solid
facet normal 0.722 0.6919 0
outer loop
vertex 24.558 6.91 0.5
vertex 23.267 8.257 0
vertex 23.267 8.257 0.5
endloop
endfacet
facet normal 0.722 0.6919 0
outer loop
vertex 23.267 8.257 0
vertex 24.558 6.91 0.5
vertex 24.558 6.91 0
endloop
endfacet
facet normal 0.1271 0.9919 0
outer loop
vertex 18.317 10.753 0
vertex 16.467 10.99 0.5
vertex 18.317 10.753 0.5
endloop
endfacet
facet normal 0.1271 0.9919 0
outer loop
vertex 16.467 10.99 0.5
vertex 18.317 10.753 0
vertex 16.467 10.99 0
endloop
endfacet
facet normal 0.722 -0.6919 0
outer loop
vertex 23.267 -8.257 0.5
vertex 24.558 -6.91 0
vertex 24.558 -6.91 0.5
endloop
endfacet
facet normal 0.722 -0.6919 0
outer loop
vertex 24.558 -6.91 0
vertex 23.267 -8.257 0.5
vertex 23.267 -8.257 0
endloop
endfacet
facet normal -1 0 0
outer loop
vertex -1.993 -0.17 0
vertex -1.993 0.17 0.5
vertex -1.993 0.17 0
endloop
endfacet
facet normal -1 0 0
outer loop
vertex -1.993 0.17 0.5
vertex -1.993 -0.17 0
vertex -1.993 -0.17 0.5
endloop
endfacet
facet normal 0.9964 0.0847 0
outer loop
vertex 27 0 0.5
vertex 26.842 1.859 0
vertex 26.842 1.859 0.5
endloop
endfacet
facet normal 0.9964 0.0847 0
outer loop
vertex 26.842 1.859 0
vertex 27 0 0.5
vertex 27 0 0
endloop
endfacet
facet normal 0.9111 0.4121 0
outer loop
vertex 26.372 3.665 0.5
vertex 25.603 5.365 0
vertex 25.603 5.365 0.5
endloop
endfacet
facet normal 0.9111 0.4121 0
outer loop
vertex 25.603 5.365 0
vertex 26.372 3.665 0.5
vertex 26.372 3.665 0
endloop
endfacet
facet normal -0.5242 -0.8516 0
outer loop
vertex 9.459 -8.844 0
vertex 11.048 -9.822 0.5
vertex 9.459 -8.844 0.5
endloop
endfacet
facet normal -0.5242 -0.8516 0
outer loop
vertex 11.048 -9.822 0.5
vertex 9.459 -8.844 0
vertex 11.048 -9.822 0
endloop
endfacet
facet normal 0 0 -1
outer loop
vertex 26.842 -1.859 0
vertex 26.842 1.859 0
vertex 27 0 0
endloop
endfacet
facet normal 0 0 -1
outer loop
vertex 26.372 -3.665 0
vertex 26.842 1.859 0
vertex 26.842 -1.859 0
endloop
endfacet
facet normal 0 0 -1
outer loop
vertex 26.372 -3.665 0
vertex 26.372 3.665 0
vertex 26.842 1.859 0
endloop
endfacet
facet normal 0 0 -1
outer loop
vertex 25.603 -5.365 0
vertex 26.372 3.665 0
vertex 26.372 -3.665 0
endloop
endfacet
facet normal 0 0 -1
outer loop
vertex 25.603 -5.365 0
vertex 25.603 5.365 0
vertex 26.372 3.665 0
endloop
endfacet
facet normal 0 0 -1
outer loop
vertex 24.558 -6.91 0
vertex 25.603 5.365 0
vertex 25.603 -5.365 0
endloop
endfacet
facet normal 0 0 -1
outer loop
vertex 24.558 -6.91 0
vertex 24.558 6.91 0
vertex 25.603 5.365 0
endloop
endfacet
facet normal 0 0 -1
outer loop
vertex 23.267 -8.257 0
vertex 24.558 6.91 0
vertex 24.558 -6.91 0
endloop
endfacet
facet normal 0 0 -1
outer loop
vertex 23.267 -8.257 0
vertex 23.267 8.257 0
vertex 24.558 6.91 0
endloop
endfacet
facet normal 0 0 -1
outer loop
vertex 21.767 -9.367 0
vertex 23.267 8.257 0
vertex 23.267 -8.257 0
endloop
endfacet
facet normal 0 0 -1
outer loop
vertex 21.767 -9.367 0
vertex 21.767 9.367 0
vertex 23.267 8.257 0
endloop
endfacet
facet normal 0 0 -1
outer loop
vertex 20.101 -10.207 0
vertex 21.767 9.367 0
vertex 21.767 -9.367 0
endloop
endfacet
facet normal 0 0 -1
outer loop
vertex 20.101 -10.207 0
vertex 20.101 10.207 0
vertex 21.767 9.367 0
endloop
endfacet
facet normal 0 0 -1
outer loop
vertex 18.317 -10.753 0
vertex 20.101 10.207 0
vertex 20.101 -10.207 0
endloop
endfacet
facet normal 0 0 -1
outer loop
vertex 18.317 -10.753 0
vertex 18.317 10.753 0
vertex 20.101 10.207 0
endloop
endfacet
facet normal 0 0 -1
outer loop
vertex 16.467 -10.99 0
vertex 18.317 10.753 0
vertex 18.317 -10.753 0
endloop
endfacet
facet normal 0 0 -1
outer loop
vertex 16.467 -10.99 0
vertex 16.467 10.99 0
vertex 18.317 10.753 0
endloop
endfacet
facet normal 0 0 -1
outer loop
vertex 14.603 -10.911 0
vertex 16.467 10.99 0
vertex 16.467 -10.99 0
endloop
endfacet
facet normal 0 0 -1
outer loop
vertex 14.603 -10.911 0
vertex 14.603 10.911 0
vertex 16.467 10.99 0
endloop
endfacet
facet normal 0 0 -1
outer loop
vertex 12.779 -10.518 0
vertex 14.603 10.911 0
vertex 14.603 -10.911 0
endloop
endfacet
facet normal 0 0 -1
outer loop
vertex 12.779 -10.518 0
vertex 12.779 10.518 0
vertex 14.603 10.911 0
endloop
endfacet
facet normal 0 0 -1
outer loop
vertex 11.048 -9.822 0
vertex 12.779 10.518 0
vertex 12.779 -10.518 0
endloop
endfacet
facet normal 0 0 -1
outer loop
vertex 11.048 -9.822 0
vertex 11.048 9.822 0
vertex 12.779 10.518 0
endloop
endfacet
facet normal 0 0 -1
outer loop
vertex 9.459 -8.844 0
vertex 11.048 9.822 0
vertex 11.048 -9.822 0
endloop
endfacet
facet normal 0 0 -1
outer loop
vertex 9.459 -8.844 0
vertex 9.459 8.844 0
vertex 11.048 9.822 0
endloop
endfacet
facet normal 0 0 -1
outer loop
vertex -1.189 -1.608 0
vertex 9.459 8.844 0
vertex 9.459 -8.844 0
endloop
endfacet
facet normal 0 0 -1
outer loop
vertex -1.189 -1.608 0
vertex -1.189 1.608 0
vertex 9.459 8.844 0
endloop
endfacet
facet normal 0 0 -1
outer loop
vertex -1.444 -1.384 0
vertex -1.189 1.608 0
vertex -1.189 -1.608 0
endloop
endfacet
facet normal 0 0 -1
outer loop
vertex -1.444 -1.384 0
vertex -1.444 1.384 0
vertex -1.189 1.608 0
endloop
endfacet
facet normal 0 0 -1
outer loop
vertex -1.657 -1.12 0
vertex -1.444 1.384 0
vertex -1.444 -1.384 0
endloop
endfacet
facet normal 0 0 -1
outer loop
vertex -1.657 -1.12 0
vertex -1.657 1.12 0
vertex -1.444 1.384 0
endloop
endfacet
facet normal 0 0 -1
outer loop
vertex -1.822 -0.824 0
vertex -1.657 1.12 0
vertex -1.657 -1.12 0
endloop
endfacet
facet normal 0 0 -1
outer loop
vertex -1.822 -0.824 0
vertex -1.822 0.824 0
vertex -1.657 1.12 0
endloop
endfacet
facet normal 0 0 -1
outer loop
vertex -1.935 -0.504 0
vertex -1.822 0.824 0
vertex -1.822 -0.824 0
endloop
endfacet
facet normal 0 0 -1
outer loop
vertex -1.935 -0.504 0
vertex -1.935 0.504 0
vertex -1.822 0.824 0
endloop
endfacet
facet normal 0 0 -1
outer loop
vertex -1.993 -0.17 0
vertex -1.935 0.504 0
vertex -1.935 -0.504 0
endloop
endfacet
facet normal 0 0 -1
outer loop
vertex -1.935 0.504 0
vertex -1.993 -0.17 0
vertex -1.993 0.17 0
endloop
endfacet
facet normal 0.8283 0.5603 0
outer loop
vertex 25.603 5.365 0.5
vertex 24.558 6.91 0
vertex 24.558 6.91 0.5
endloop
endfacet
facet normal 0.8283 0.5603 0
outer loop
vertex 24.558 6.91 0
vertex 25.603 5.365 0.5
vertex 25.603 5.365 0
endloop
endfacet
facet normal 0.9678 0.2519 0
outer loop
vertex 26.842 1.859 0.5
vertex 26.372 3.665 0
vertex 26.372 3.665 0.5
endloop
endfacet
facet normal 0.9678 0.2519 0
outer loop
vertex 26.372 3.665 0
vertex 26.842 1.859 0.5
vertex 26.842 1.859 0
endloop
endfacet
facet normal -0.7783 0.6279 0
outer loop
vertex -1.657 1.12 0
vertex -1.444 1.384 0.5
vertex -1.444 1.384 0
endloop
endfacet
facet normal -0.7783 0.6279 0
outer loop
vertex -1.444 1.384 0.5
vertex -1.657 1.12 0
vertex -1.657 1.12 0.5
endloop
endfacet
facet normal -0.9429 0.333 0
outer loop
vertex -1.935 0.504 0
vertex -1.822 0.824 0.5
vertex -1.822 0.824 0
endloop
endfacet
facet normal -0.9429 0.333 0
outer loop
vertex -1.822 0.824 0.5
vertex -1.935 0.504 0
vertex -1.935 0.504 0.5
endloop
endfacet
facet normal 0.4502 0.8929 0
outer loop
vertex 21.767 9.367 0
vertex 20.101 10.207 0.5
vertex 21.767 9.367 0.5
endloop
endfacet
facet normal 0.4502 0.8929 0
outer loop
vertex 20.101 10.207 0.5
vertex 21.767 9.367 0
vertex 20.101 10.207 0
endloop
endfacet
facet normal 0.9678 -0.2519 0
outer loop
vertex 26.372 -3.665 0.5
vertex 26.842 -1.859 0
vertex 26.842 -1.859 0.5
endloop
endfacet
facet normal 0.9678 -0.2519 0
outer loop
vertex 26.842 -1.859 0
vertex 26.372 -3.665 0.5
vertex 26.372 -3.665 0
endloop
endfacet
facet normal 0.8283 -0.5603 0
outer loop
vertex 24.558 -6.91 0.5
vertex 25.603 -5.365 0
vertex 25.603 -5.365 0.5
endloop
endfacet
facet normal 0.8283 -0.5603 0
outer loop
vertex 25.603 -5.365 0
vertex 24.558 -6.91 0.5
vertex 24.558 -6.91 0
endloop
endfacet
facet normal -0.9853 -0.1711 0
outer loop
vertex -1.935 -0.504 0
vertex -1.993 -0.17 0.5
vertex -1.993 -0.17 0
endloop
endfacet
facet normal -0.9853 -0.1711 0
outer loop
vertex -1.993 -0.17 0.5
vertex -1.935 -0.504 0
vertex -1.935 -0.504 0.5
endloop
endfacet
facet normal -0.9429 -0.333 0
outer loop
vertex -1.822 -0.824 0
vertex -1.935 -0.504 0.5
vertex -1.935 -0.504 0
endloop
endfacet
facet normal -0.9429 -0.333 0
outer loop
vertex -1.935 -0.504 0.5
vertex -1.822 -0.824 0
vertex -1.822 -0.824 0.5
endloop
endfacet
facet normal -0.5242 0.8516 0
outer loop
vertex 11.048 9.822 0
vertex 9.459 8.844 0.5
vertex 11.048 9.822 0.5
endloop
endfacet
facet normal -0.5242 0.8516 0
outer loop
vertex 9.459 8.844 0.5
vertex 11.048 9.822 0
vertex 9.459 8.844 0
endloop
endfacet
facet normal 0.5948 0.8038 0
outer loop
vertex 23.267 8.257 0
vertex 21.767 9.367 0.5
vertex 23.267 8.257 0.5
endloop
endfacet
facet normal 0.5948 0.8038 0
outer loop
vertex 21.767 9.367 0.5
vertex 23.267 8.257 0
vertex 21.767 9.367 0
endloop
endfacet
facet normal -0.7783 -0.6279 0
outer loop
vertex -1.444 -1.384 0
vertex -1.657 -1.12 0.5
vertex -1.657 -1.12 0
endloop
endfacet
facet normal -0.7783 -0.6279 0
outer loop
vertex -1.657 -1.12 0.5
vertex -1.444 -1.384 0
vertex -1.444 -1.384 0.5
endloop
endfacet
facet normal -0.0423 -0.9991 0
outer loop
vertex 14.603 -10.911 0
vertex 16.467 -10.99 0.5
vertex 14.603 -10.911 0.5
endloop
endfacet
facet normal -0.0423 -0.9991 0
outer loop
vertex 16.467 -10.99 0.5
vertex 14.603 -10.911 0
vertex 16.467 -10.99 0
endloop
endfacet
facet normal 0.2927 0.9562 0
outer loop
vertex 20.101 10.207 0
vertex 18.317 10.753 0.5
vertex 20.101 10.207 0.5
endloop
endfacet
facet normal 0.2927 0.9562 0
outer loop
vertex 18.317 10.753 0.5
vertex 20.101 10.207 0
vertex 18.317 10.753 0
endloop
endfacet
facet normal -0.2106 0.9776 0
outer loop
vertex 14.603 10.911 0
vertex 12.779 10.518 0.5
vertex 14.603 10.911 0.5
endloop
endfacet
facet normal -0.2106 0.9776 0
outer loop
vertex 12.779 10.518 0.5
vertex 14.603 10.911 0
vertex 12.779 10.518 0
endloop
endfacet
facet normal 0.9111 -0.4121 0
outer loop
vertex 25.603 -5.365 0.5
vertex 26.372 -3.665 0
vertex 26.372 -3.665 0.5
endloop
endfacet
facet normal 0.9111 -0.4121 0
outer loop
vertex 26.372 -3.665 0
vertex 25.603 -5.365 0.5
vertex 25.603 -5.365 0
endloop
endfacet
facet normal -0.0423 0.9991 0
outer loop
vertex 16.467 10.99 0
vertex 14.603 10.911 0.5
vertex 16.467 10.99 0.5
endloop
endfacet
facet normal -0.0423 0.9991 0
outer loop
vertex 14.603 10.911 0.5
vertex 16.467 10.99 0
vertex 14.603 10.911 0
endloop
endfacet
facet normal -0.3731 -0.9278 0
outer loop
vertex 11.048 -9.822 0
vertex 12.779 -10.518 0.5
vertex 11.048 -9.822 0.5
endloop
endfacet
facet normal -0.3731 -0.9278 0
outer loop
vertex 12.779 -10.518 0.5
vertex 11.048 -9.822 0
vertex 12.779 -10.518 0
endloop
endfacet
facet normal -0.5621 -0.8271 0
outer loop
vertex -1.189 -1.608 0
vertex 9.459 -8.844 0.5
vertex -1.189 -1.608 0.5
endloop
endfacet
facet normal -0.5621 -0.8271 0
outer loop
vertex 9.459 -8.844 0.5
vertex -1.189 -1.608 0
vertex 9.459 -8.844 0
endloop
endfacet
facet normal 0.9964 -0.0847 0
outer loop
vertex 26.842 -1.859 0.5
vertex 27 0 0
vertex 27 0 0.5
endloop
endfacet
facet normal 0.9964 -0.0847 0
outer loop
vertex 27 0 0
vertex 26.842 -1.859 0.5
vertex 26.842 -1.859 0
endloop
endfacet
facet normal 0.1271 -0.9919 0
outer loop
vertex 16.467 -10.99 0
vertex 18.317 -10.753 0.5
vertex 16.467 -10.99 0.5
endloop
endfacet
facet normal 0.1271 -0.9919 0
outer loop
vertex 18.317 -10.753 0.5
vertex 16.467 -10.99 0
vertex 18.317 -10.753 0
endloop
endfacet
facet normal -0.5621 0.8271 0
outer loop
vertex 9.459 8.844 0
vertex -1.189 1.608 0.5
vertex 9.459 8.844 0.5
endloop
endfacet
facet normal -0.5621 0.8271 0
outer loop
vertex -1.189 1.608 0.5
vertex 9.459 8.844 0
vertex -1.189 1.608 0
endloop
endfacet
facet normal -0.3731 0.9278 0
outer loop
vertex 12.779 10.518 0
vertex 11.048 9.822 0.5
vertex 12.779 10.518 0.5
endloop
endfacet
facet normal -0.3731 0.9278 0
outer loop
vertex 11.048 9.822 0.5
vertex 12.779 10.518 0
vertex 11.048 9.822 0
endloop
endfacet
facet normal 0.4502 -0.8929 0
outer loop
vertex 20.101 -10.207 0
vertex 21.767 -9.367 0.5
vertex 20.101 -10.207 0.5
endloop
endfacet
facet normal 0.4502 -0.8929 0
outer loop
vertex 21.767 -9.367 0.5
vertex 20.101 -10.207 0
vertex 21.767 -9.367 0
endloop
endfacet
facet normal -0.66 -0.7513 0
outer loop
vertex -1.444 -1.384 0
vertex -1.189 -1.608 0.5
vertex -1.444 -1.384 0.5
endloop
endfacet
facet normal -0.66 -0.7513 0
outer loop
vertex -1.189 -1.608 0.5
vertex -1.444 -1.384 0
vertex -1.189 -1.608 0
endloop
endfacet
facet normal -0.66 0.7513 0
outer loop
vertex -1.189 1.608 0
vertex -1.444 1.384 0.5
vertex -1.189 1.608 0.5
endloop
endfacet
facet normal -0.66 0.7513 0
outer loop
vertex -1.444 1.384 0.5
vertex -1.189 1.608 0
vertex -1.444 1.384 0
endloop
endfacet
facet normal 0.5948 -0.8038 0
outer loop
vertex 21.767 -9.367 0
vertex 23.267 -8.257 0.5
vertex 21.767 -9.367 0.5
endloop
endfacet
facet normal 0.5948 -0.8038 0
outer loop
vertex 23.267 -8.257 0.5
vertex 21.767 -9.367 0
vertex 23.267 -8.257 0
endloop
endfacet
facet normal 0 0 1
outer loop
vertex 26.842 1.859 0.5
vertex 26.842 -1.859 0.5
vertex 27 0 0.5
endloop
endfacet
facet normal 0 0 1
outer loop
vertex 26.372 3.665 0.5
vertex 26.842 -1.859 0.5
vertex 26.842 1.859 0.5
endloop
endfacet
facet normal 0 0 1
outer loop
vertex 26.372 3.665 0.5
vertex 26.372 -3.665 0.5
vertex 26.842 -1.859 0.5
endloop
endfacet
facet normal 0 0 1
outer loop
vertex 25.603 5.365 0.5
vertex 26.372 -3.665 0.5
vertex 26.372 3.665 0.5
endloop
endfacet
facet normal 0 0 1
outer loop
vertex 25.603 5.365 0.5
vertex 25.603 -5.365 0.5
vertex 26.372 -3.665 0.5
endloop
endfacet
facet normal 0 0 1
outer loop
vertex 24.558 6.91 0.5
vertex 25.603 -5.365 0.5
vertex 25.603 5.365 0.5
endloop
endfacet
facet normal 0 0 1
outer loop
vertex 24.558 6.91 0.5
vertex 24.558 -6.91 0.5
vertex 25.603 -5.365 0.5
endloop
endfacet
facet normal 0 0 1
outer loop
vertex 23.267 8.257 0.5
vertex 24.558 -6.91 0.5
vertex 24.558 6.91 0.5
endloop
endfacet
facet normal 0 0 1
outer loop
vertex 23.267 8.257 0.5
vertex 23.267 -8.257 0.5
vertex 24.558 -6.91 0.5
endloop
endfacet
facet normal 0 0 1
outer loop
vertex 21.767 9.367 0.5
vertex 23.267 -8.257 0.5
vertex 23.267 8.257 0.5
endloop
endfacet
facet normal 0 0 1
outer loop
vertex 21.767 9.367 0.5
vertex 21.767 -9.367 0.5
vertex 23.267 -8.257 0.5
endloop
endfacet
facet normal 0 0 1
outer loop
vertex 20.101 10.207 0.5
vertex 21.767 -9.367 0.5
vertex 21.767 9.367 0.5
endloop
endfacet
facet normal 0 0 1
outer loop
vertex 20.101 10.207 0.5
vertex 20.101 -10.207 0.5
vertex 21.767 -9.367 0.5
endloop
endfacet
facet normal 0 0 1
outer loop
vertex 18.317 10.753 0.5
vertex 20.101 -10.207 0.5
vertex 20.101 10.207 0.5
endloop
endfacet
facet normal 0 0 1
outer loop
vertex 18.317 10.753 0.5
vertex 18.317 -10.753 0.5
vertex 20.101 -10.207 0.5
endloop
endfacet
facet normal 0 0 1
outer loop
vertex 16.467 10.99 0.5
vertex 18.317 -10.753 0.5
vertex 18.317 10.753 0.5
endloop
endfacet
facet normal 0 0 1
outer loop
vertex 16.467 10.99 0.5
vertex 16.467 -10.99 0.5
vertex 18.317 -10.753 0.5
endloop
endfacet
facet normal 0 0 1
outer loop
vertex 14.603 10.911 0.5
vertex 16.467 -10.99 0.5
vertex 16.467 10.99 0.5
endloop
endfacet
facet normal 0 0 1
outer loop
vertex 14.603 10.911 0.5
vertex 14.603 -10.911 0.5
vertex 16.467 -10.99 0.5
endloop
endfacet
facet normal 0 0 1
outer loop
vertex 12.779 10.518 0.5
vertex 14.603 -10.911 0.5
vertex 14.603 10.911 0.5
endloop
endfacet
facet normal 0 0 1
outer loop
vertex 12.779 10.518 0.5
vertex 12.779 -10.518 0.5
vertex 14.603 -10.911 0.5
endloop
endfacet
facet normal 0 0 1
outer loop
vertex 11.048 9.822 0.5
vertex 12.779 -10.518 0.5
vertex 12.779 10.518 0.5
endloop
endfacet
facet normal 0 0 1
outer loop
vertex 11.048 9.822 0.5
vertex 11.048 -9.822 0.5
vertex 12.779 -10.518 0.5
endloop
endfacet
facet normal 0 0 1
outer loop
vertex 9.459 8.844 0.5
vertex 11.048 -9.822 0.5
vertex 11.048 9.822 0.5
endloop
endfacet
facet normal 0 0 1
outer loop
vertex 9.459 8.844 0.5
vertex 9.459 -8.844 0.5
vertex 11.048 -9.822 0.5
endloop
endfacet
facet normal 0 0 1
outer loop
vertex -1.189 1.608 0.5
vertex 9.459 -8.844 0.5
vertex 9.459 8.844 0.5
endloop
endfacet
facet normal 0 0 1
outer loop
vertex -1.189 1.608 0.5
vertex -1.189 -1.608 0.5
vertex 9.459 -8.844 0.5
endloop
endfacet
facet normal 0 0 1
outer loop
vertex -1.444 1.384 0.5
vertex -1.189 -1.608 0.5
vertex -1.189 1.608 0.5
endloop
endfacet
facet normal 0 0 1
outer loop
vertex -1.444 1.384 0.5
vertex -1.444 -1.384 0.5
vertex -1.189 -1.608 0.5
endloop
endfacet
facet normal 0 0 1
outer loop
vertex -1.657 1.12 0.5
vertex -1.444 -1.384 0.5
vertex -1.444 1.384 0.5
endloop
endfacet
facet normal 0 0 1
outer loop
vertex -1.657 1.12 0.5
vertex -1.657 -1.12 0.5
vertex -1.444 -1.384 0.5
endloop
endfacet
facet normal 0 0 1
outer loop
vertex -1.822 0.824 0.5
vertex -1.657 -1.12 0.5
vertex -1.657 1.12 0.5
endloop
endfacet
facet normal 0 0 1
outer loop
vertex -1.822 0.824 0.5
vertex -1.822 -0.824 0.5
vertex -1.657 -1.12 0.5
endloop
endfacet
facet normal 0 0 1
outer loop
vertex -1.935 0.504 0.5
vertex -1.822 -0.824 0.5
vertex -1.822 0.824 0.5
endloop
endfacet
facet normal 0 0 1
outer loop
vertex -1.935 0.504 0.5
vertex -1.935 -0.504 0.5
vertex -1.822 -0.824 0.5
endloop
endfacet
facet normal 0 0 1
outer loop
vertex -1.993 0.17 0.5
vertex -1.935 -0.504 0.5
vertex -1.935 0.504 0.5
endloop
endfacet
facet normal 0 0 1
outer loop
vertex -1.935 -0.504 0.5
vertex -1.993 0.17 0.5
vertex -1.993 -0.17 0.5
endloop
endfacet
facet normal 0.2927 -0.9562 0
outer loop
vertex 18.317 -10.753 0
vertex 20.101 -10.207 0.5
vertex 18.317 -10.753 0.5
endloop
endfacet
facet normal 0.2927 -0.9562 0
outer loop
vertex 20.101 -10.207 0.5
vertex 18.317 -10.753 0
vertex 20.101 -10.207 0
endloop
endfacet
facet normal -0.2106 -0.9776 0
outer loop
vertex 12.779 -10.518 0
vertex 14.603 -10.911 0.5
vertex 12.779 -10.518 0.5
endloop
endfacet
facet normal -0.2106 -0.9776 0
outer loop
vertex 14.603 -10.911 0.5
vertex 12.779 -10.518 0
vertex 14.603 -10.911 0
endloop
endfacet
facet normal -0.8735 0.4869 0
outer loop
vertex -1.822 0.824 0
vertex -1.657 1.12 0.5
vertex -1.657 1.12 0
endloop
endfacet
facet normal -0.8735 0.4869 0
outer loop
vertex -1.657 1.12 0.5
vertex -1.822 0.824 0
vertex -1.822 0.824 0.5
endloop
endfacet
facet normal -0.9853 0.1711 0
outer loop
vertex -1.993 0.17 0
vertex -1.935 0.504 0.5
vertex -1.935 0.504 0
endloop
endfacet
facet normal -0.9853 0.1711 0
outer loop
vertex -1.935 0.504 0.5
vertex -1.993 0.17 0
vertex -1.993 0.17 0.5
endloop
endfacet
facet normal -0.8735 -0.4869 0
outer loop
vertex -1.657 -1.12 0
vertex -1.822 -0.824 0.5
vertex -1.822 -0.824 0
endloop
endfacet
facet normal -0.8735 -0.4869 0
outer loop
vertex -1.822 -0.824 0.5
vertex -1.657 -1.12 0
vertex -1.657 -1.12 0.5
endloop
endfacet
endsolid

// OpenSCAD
$fn = 37;
pick_length = 16;
tip_radius = 2;
hold_radius = 11;

module pick() {
  hull() {
    translate([0,0,0.0]) cylinder(r=tip_radius,h=0.5);
    translate([pick_length,0,0]) cylinder(r=hold_radius,h=0.5);
  }
}

difference() {
  pick();

  // Now decorate the pick with some features.
  
  
  translate([pick_length,0,]) {
    for (angle = [0:60:300]) {
      ;
    }
  } 
}
